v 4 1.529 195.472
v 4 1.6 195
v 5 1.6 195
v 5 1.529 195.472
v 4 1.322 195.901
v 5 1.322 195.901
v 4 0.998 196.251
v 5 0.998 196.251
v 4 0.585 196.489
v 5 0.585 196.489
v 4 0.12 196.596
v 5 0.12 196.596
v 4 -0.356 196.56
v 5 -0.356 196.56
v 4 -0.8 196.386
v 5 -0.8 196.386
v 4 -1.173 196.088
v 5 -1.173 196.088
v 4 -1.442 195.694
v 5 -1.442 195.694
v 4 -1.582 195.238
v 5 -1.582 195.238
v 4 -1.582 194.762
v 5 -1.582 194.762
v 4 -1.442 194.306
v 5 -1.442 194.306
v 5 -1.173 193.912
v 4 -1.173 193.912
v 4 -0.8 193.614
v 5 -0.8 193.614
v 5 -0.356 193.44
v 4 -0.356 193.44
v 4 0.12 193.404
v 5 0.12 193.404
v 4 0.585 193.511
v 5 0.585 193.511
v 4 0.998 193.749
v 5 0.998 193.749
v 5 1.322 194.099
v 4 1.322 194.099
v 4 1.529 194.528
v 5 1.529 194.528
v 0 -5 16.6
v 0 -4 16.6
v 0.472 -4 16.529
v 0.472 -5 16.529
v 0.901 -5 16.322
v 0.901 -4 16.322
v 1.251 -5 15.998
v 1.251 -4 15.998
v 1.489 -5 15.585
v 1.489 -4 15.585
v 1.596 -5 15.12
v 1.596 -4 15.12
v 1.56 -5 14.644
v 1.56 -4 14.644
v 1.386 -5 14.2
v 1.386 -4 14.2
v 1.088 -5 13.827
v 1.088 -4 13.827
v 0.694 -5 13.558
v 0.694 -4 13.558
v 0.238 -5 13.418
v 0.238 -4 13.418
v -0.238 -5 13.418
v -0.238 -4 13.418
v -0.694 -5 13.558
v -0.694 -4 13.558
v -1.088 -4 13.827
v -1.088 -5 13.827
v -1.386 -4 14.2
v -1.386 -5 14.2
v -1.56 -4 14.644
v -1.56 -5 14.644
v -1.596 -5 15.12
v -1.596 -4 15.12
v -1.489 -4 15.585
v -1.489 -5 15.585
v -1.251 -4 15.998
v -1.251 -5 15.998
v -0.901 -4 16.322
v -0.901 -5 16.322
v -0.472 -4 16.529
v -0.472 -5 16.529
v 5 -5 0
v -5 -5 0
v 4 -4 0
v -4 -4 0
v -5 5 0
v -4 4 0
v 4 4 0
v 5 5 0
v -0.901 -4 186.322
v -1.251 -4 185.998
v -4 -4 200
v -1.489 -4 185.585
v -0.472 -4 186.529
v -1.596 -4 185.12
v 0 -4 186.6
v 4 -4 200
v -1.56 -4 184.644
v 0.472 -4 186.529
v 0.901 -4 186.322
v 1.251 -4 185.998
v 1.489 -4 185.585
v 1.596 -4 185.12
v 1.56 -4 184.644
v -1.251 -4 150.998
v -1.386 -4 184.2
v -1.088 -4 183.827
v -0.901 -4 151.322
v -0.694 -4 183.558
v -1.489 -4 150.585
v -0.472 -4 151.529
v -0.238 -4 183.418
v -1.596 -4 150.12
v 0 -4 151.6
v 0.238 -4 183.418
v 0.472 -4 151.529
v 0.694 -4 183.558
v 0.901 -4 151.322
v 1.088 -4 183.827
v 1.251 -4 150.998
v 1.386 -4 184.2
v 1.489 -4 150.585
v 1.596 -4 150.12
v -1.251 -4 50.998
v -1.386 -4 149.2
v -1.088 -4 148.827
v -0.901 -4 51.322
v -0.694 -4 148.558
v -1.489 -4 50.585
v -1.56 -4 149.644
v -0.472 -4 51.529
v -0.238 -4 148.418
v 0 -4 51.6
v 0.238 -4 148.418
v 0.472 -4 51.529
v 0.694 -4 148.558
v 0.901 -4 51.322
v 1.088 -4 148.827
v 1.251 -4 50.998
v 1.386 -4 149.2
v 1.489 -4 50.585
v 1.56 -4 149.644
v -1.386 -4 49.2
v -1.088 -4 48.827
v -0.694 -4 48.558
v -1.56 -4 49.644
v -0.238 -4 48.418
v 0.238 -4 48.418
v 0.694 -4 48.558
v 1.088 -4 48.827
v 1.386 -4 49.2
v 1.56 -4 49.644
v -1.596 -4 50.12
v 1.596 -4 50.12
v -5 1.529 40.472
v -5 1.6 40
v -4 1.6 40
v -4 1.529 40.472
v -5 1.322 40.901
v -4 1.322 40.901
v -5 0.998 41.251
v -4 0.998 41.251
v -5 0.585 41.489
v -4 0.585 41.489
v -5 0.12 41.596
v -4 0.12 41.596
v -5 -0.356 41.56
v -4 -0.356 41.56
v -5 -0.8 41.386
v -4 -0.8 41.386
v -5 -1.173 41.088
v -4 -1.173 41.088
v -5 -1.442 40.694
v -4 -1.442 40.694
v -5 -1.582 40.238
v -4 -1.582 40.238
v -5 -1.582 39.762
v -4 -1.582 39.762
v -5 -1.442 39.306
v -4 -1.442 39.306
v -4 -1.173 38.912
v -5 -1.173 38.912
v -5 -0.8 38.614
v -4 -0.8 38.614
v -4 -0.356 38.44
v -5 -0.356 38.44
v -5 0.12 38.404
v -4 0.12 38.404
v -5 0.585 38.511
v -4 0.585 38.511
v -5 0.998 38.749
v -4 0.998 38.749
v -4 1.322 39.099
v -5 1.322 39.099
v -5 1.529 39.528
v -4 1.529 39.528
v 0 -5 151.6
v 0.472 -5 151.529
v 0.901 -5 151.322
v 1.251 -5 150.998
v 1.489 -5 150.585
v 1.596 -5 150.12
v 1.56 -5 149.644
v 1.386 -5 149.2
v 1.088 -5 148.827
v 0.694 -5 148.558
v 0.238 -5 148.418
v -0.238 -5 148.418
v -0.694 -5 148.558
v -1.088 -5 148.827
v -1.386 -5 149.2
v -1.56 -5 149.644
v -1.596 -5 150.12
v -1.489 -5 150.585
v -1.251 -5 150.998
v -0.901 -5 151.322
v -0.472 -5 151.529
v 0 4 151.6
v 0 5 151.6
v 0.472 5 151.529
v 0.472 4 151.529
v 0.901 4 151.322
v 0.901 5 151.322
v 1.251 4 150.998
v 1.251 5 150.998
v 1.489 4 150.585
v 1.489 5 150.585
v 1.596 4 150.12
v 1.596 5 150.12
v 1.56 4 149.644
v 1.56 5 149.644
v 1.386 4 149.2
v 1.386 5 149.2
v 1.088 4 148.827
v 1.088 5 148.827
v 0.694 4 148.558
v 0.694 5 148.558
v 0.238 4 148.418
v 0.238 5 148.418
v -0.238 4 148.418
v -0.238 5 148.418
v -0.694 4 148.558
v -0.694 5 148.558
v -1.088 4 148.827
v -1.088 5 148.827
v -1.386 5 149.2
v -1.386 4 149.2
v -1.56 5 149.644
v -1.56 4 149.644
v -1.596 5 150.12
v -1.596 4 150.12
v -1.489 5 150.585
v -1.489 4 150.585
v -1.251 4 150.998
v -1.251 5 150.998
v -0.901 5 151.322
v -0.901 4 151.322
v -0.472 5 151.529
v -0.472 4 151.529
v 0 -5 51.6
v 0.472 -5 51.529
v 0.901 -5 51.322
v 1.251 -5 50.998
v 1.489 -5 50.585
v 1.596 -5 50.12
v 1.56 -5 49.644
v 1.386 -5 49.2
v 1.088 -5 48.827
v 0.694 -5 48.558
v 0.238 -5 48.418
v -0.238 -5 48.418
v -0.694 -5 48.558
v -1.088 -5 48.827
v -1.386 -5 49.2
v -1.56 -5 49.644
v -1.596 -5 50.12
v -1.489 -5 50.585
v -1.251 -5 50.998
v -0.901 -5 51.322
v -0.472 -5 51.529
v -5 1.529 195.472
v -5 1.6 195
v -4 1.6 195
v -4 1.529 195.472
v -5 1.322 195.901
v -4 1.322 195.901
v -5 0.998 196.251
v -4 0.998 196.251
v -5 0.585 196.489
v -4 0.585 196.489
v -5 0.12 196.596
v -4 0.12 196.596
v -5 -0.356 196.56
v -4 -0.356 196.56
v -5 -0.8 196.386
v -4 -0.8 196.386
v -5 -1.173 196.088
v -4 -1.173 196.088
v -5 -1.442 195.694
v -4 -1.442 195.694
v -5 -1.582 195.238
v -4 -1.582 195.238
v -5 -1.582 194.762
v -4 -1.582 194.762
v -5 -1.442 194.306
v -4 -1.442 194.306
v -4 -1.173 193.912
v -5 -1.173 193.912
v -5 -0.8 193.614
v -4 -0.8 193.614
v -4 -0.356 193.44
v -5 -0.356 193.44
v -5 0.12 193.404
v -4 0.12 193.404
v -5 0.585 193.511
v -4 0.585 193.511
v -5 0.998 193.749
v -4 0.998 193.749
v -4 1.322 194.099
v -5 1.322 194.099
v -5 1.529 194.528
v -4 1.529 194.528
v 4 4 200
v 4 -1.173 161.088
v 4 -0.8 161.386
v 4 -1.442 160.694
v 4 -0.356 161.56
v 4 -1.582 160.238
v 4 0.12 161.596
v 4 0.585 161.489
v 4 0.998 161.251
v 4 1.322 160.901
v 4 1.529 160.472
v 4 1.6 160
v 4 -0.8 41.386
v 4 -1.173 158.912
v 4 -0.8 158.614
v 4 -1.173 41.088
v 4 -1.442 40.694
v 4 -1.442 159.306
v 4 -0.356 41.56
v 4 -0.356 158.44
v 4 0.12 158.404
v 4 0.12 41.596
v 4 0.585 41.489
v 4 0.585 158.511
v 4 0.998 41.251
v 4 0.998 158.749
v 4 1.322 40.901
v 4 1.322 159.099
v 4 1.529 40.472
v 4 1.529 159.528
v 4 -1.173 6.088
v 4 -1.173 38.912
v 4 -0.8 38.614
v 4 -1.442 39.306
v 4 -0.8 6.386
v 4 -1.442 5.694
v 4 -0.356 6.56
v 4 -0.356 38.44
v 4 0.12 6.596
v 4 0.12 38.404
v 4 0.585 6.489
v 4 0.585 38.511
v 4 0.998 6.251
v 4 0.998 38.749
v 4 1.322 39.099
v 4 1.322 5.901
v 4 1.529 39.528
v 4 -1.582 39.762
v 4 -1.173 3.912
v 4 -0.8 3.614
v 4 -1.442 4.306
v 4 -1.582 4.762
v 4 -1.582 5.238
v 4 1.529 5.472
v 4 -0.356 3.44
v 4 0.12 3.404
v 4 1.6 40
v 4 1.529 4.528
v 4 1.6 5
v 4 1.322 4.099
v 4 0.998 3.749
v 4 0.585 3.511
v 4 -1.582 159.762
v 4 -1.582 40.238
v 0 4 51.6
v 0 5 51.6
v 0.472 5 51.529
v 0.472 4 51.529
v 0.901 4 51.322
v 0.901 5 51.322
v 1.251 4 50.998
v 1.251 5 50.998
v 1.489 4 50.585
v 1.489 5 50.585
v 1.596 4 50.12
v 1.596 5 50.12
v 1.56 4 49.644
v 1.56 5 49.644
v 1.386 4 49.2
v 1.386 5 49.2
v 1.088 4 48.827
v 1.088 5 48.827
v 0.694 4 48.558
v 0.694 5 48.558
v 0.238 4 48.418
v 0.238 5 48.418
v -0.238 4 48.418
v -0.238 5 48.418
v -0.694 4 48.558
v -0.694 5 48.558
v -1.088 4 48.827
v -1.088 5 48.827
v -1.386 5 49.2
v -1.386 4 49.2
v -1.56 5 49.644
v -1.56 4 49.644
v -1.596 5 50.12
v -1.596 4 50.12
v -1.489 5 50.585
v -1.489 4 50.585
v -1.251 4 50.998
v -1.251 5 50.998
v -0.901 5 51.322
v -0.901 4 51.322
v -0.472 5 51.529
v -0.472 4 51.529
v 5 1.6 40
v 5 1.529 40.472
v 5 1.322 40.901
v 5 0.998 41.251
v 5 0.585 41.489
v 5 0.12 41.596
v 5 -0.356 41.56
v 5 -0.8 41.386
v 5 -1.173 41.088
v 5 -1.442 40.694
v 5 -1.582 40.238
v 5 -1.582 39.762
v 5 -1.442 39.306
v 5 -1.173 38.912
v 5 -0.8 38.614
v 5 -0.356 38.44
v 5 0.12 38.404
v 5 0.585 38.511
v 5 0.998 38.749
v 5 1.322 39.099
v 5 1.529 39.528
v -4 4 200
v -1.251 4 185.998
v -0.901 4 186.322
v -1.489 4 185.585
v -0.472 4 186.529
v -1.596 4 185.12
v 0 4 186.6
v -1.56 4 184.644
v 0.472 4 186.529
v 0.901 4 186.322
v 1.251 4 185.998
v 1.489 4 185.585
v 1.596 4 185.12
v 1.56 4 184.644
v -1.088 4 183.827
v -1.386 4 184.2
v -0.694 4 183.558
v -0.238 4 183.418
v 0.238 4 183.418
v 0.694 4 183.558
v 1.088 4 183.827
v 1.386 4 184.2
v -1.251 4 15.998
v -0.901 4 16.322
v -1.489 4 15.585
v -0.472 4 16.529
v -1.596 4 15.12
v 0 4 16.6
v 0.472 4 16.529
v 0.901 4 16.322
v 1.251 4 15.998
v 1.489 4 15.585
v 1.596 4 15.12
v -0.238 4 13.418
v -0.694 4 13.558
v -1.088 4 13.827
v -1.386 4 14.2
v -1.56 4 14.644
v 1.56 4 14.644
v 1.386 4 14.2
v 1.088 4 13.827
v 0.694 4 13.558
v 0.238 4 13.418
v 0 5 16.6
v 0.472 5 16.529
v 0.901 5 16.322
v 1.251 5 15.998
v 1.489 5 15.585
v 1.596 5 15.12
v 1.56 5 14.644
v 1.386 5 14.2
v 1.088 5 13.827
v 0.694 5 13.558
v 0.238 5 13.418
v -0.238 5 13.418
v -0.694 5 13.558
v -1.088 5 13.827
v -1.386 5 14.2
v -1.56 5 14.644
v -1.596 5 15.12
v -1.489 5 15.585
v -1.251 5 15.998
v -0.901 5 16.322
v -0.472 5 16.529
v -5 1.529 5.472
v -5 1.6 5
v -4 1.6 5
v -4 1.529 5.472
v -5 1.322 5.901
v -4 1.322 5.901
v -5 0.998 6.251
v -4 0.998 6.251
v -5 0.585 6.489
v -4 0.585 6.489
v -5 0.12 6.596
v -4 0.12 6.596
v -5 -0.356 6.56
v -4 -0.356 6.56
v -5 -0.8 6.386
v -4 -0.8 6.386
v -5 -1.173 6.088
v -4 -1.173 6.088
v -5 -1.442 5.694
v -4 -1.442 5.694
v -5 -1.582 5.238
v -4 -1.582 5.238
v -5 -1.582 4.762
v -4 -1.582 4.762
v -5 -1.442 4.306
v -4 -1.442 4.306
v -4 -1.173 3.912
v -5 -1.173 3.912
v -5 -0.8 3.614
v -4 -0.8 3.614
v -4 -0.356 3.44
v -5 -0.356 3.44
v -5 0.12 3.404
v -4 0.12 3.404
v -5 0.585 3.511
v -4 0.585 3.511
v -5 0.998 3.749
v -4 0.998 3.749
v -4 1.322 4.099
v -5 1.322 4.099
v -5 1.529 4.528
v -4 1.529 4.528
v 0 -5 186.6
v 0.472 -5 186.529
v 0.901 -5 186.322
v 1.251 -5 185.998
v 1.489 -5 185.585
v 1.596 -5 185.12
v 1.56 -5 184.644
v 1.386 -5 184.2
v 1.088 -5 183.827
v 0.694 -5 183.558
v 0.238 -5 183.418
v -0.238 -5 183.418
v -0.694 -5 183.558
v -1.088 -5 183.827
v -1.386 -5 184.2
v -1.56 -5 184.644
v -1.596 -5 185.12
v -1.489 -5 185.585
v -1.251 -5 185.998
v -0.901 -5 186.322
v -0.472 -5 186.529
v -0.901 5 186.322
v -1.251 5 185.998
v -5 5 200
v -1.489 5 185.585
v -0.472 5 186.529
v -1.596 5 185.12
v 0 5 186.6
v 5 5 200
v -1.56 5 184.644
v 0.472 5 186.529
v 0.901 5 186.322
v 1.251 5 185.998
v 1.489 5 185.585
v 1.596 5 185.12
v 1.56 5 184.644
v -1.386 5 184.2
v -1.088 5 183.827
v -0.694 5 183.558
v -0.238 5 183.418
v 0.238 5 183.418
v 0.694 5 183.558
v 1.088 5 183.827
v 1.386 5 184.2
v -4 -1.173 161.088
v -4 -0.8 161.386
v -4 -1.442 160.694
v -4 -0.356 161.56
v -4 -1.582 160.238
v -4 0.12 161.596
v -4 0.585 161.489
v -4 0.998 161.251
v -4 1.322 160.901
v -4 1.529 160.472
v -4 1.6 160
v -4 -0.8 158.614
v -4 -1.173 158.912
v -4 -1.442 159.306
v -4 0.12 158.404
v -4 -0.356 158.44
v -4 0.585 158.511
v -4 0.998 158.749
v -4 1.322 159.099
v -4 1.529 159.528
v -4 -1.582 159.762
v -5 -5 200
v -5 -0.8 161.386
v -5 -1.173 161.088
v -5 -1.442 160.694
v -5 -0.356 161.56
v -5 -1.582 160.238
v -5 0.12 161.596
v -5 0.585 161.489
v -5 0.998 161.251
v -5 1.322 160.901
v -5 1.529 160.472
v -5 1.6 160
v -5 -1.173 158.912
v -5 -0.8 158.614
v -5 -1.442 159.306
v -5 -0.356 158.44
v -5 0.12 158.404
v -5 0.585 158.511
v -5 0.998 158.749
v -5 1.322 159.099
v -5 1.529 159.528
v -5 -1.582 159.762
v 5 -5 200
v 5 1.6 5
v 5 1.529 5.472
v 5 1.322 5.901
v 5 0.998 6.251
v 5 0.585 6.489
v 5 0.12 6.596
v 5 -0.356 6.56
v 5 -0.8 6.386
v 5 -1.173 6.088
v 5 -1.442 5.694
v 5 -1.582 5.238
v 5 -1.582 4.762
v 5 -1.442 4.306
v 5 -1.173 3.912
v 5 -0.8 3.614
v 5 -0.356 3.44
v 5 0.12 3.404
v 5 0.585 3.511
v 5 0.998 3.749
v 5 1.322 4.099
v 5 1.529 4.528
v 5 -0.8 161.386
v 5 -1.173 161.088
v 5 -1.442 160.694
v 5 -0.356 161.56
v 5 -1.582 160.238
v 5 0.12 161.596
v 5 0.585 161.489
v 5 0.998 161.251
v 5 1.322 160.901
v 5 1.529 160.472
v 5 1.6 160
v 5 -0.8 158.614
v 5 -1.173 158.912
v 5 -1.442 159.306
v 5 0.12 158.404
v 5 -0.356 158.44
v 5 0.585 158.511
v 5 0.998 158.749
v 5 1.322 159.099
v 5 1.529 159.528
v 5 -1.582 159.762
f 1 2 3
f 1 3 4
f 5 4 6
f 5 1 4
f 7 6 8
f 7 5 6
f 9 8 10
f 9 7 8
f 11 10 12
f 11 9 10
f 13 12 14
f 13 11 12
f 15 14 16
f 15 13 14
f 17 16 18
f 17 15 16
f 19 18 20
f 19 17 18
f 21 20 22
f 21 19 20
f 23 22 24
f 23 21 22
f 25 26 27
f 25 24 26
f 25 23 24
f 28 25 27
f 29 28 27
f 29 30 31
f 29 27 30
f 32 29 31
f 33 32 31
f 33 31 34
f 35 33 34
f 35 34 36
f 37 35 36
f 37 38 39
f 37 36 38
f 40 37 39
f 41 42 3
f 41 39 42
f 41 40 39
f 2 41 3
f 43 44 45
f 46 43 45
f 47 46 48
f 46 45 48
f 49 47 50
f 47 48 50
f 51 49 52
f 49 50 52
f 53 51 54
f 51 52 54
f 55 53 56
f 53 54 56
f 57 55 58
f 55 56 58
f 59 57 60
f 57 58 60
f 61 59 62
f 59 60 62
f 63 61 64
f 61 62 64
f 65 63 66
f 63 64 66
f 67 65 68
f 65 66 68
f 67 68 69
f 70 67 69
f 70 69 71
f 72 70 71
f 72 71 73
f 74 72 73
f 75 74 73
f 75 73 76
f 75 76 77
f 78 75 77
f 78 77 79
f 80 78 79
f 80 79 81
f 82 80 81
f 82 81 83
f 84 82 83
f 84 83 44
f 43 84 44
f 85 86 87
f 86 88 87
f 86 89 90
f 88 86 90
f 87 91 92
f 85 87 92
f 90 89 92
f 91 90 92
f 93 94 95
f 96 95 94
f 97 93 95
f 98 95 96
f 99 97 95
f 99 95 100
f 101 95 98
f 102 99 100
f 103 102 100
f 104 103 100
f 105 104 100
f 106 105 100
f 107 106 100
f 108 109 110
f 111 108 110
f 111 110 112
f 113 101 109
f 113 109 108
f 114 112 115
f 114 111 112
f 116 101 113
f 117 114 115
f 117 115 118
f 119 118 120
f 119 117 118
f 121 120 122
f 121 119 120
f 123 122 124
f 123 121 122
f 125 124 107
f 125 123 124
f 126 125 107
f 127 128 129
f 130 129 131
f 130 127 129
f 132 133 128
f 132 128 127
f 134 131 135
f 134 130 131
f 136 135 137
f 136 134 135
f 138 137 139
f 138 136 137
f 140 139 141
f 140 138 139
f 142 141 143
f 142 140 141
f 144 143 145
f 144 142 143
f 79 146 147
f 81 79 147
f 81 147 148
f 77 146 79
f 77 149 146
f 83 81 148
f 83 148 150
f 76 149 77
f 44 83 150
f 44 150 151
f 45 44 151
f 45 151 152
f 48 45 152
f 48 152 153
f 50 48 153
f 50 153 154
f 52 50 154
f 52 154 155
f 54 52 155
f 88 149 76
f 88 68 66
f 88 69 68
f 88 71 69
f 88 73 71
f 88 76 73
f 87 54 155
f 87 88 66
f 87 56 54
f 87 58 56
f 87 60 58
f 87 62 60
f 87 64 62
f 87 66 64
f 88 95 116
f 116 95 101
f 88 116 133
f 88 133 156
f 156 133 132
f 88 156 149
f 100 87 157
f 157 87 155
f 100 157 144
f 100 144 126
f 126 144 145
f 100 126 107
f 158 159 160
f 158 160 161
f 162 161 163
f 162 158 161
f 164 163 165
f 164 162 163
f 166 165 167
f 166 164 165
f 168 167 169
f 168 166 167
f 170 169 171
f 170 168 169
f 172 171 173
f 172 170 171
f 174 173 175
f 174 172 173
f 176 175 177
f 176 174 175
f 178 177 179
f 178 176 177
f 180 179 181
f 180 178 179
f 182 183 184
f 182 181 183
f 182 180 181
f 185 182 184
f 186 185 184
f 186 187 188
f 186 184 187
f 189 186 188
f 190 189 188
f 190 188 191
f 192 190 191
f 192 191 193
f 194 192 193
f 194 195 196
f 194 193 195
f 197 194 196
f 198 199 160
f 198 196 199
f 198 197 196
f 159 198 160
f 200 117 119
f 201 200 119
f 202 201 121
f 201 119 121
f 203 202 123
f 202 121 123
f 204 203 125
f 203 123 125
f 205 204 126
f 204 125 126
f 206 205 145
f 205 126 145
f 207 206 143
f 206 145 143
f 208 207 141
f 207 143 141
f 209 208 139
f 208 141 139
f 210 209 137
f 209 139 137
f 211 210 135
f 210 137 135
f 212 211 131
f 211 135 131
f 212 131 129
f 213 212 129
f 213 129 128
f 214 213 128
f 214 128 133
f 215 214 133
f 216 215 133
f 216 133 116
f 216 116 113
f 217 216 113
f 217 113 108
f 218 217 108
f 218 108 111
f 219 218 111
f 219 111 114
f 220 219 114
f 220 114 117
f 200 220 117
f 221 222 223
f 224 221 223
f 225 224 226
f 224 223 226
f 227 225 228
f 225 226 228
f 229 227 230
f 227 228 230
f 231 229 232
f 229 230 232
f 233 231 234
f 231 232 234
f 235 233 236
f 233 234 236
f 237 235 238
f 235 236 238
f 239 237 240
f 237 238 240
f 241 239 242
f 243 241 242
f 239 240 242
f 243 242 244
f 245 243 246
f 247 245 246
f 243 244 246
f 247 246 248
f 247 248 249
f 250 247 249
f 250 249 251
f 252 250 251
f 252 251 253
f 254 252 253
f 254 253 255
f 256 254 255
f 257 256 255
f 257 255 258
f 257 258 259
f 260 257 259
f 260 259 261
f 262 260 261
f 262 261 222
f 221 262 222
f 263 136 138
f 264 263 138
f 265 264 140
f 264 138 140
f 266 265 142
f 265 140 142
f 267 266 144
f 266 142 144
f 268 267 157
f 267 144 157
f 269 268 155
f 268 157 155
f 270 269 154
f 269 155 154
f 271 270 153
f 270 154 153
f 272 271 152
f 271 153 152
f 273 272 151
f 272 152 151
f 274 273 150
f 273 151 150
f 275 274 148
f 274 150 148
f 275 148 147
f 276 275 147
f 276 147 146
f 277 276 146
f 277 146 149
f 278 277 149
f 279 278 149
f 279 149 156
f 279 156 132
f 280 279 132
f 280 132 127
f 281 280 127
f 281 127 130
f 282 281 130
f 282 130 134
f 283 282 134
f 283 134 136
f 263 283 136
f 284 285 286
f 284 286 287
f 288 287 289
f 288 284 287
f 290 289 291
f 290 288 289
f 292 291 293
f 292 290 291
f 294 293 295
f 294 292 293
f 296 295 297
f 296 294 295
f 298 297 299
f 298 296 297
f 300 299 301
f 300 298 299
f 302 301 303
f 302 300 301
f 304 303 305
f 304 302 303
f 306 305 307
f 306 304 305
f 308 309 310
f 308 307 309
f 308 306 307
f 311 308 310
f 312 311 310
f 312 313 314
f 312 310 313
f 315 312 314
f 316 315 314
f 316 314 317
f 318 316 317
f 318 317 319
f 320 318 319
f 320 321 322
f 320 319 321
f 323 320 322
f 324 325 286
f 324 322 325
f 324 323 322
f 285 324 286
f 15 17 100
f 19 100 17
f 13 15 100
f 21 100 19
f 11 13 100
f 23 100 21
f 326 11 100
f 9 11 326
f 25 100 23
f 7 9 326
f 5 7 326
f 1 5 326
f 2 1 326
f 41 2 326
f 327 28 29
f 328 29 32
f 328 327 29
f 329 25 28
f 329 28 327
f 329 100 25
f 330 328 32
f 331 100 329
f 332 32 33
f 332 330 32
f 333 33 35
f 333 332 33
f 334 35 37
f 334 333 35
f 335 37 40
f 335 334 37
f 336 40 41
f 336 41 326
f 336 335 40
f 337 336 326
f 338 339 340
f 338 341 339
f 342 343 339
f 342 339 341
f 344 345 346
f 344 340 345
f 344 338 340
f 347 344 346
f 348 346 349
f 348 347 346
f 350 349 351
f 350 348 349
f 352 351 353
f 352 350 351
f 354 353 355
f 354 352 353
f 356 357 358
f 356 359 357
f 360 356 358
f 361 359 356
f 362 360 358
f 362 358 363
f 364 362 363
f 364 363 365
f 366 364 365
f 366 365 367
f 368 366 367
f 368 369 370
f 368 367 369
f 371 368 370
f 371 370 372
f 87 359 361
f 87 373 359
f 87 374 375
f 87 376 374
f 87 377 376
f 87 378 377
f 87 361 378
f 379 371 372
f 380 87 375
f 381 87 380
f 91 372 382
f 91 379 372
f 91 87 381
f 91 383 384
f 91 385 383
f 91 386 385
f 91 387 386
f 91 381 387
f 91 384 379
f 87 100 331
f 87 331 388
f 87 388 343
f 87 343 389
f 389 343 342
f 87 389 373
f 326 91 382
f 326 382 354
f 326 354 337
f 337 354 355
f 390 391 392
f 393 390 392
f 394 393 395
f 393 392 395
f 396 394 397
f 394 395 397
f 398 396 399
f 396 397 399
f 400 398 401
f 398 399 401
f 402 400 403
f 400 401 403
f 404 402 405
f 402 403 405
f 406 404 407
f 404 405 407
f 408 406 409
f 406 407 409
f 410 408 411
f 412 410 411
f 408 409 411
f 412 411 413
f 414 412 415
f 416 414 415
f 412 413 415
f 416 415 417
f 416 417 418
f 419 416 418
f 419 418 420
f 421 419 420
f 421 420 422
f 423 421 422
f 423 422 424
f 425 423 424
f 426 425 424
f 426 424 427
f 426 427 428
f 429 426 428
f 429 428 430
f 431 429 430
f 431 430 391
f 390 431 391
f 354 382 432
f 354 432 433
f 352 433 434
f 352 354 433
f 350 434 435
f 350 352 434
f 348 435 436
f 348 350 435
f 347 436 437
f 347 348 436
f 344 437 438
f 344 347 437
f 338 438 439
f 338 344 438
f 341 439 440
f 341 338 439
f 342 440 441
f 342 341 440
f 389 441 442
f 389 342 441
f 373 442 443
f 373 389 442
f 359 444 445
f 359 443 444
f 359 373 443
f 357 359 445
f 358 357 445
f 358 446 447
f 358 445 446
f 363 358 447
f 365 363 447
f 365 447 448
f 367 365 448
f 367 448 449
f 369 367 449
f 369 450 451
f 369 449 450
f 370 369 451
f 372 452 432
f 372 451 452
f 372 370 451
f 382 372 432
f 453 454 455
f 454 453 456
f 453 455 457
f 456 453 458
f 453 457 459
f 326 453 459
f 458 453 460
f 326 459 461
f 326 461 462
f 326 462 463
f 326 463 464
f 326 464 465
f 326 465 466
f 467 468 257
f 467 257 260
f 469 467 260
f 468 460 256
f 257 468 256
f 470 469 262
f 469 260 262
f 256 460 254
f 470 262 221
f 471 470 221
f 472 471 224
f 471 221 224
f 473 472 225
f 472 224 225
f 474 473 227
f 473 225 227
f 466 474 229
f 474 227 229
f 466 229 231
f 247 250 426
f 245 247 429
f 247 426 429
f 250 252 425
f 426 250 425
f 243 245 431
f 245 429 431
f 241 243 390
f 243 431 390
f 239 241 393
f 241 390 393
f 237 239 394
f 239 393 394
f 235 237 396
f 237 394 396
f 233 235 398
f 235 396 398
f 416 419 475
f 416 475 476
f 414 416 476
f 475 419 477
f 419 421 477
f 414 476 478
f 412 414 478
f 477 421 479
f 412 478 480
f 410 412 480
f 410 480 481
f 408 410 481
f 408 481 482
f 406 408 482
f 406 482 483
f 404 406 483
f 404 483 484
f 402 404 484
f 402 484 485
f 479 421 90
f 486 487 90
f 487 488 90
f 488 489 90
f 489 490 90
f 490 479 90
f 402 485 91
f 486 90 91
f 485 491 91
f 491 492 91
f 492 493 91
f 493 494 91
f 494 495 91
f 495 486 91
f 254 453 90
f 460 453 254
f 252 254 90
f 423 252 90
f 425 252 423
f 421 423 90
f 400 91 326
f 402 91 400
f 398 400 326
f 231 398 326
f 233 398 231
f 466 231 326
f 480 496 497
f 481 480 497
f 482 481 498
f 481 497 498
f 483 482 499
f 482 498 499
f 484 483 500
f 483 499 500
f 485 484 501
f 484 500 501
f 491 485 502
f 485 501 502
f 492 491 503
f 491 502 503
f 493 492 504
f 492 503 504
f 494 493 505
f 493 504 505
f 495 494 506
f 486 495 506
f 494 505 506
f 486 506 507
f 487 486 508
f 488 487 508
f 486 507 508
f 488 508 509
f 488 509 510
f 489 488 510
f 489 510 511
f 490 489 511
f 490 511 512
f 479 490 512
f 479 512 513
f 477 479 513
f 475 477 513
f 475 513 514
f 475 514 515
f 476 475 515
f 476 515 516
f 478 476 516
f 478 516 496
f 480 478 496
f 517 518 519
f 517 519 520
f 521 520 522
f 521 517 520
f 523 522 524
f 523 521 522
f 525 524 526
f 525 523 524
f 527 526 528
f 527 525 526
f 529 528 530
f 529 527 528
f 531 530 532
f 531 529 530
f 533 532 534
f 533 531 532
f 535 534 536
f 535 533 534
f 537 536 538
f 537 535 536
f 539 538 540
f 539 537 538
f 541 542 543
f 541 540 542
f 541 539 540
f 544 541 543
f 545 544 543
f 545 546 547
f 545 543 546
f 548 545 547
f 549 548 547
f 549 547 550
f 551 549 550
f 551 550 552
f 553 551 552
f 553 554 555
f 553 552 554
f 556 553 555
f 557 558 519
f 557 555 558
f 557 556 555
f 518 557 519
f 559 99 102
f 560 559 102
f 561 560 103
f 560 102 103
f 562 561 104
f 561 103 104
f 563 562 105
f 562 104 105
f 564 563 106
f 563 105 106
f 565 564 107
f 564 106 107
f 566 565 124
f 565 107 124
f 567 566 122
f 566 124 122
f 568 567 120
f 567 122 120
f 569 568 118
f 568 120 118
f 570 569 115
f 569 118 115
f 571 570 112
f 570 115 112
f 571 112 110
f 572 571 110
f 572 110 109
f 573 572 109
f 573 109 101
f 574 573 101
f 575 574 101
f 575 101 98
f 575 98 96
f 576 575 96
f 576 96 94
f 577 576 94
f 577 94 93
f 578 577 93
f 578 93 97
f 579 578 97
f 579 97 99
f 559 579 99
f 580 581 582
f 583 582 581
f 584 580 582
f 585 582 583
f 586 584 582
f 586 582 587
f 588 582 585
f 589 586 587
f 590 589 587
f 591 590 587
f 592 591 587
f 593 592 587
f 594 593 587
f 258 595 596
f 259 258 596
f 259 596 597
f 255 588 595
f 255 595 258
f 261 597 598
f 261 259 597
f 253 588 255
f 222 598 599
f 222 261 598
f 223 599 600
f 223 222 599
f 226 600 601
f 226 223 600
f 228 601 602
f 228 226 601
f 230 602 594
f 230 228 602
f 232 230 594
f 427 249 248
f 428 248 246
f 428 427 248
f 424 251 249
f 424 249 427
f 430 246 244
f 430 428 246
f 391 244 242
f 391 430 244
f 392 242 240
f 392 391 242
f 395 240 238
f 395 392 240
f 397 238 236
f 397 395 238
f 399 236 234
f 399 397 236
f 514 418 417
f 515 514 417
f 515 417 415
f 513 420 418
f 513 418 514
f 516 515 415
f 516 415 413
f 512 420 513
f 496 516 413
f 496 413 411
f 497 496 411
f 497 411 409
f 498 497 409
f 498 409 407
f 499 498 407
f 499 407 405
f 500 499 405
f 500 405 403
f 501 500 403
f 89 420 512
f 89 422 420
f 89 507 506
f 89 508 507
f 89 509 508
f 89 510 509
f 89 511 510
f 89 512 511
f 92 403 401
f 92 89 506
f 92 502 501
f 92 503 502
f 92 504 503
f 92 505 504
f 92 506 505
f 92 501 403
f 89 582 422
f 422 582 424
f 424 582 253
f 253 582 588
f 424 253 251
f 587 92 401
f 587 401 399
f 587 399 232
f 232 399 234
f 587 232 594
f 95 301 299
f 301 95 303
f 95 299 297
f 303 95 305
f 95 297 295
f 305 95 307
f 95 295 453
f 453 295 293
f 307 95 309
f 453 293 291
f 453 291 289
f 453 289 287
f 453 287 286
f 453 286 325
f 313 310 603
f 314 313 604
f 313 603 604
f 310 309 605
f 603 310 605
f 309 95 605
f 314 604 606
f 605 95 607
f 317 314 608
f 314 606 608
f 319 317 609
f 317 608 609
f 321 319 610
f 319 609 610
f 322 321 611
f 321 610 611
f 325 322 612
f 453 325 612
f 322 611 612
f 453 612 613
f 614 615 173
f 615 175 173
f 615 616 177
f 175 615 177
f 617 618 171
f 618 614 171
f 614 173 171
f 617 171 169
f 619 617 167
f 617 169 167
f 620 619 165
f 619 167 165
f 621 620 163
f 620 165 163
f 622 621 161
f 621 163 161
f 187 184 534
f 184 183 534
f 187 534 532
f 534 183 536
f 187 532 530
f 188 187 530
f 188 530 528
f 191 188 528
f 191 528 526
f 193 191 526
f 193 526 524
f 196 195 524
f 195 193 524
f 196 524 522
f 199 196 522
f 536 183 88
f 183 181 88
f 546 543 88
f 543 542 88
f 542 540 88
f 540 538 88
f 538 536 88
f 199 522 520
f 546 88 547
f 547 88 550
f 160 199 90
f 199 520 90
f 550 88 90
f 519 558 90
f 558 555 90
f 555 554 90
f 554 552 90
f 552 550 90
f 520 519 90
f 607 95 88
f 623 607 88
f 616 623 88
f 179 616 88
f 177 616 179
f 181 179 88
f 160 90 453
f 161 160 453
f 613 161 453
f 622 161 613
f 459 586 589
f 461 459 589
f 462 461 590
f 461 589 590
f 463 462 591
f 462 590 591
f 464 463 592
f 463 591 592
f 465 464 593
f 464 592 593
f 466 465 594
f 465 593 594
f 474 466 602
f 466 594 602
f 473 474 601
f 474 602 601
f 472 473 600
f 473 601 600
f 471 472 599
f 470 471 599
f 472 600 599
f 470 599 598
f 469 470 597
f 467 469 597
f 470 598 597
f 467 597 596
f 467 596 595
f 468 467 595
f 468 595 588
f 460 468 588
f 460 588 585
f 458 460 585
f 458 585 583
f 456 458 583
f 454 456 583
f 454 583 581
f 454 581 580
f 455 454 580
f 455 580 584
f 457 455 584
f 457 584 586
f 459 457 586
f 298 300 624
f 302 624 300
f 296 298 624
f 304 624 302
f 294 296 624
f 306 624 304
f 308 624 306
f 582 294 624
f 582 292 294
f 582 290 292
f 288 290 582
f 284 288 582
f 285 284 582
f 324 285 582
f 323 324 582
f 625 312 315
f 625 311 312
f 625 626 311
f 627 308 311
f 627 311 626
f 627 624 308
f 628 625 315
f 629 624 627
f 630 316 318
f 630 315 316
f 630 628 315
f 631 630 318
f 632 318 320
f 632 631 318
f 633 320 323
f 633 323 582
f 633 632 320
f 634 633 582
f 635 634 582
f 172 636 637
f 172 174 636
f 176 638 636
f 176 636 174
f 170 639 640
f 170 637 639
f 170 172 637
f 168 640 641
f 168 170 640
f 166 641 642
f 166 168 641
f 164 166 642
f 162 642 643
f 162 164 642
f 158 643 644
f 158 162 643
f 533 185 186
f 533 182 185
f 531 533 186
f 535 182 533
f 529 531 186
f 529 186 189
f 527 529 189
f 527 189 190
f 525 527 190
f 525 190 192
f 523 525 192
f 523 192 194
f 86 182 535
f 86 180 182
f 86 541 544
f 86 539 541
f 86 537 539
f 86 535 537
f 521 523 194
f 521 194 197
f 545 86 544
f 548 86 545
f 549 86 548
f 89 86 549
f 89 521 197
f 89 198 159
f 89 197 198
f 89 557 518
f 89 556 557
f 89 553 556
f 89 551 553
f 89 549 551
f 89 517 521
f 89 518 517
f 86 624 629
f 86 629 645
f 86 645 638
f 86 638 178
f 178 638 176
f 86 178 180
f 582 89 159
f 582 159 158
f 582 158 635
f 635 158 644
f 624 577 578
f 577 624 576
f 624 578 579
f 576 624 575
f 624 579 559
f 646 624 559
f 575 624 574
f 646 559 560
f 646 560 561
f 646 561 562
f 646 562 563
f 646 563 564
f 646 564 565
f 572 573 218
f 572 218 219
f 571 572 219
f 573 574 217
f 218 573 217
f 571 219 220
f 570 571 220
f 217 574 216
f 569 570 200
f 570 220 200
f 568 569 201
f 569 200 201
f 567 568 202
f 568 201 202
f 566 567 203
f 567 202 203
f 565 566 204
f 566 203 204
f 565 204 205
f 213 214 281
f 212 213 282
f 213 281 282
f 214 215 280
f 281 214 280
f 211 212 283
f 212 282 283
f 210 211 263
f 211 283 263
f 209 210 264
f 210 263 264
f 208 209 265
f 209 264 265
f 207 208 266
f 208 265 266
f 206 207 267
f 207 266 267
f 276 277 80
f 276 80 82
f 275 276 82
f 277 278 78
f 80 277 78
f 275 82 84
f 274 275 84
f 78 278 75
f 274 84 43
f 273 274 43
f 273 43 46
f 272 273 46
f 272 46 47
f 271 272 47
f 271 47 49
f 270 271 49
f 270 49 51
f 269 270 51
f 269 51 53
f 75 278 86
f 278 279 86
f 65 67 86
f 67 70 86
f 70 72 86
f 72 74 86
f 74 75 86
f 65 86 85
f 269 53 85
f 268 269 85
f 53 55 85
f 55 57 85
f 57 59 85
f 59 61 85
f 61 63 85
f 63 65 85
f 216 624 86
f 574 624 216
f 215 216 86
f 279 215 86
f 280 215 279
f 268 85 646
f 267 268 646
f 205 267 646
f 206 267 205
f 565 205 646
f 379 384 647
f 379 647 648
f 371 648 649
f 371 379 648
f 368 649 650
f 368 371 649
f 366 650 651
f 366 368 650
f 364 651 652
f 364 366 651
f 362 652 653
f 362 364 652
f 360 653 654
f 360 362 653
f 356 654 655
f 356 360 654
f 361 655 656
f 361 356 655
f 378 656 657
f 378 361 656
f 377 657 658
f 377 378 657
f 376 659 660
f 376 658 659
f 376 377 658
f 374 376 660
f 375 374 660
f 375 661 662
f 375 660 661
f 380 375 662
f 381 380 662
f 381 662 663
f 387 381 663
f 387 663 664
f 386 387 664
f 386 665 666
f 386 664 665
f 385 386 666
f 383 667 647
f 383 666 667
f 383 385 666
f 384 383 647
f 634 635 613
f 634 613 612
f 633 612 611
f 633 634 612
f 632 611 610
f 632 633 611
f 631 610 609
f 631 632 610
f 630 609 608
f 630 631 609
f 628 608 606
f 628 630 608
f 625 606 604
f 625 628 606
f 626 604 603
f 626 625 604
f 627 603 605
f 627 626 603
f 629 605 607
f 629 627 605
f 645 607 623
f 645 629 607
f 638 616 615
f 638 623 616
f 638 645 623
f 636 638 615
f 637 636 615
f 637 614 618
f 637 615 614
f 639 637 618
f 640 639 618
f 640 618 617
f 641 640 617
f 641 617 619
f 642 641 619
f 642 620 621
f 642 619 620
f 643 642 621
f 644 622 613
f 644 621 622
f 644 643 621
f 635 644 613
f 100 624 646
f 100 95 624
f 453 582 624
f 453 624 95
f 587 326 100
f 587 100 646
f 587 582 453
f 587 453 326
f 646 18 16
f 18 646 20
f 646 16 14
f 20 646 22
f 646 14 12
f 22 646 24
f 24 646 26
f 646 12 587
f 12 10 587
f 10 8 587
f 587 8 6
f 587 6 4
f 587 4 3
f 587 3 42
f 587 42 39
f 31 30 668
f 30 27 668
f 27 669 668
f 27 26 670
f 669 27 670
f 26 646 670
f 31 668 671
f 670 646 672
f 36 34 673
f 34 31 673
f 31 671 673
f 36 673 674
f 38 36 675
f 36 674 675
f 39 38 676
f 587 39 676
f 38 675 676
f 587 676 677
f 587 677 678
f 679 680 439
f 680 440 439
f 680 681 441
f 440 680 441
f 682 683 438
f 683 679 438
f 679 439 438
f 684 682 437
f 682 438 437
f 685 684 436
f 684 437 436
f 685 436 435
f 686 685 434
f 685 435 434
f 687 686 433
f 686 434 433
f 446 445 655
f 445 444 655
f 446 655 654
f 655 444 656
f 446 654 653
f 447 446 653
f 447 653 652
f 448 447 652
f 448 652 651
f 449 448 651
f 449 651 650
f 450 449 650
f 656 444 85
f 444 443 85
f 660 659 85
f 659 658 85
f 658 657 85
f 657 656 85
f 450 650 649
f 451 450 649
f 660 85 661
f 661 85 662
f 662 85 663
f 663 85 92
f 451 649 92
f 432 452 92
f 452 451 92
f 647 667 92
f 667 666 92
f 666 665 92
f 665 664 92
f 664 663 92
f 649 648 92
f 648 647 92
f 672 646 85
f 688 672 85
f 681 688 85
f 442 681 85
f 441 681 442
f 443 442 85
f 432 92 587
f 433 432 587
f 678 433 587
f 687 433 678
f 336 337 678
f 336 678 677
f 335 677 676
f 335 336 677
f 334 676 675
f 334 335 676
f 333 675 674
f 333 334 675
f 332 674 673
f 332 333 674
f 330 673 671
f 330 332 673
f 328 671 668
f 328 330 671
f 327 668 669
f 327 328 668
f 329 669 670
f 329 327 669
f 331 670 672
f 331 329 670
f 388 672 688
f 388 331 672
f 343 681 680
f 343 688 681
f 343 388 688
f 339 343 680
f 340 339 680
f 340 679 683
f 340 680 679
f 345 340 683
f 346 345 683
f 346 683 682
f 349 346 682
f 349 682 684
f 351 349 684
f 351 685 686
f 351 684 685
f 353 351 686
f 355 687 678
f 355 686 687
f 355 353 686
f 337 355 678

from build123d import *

# Parameters (mm, degrees)
SKETCH_1_W               = 10
SKETCH_1_H               = 10
SKETCH_1_W_2             = 8
SKETCH_1_H_2             = 8
EXTRUDE_1_DEPTH          = 200
CUT_EXTRUDE_1_DEPTH      = 201.31225624
CUT_EXTRUDE_1_DEPTH_BACK = 201.31225624
SKETCH_2_R               = 1.6
SKETCH_3_R               = 1.6
CUT_EXTRUDE_2_DEPTH      = 201.31225624
SKETCH_4_R               = 1.6
CUT_EXTRUDE_3_DEPTH      = 201.31225624


with BuildPart() as part:
    # ｽｹｯﾁ1 → ﾎﾞｽ - 押し出し1 (new body)
    with BuildSketch(Plane.XY):
        Rectangle(SKETCH_1_W, SKETCH_1_H)
        Rectangle(SKETCH_1_W_2, SKETCH_1_H_2, mode=Mode.SUBTRACT)
    extrude(amount=EXTRUDE_1_DEPTH)

    # ｽｹｯﾁ2 → ｶｯﾄ - 押し出し1 (cut, two sides: drawn at the far end of the back side and taken through both)
    with BuildSketch(Plane(origin=(5, 0, 0), x_dir=(0, 0, -1), z_dir=(1, 0, 0)).offset(-CUT_EXTRUDE_1_DEPTH_BACK)):
        with Locations(Location((-160, 0, 0), (0, 0, 90))):
            Circle(SKETCH_2_R)
        with Locations(Location((-40, 0, 0), (0, 0, 90))):
            Circle(SKETCH_2_R)
        with Locations(Location((-195, 0, 0), (0, 0, 90))):
            Circle(SKETCH_2_R)
        with Locations(Location((-5, 0, 0), (0, 0, 90))):
            Circle(SKETCH_2_R)
    extrude(amount=CUT_EXTRUDE_1_DEPTH + CUT_EXTRUDE_1_DEPTH_BACK, mode=Mode.SUBTRACT)

    # ｽｹｯﾁ3 → ｶｯﾄ - 押し出し2 (cut, through all)
    with BuildSketch(Plane(origin=(0, 5, 0), x_dir=(1, 0, 0), z_dir=(0, 1, 0))):
        with Locations(Location((0, -185, 0), (0, 0, 270))):
            Circle(SKETCH_3_R)
        with Locations(Location((0, -15, 0), (0, 0, 270))):
            Circle(SKETCH_3_R)
    extrude(amount=-CUT_EXTRUDE_2_DEPTH, mode=Mode.SUBTRACT)

    # ｽｹｯﾁ4 → ｶｯﾄ - 押し出し3 (cut, through all)
    with BuildSketch(Plane(origin=(0, 5, 0), x_dir=(1, 0, 0), z_dir=(0, 1, 0))):
        with Locations(Location((0, -50, 0), (0, 0, 270))):
            Circle(SKETCH_4_R)
        with Locations(Location((0, -150, 0), (0, 0, 270))):
            Circle(SKETCH_4_R)
    extrude(amount=-CUT_EXTRUDE_3_DEPTH, mode=Mode.SUBTRACT)


solid = part.part
